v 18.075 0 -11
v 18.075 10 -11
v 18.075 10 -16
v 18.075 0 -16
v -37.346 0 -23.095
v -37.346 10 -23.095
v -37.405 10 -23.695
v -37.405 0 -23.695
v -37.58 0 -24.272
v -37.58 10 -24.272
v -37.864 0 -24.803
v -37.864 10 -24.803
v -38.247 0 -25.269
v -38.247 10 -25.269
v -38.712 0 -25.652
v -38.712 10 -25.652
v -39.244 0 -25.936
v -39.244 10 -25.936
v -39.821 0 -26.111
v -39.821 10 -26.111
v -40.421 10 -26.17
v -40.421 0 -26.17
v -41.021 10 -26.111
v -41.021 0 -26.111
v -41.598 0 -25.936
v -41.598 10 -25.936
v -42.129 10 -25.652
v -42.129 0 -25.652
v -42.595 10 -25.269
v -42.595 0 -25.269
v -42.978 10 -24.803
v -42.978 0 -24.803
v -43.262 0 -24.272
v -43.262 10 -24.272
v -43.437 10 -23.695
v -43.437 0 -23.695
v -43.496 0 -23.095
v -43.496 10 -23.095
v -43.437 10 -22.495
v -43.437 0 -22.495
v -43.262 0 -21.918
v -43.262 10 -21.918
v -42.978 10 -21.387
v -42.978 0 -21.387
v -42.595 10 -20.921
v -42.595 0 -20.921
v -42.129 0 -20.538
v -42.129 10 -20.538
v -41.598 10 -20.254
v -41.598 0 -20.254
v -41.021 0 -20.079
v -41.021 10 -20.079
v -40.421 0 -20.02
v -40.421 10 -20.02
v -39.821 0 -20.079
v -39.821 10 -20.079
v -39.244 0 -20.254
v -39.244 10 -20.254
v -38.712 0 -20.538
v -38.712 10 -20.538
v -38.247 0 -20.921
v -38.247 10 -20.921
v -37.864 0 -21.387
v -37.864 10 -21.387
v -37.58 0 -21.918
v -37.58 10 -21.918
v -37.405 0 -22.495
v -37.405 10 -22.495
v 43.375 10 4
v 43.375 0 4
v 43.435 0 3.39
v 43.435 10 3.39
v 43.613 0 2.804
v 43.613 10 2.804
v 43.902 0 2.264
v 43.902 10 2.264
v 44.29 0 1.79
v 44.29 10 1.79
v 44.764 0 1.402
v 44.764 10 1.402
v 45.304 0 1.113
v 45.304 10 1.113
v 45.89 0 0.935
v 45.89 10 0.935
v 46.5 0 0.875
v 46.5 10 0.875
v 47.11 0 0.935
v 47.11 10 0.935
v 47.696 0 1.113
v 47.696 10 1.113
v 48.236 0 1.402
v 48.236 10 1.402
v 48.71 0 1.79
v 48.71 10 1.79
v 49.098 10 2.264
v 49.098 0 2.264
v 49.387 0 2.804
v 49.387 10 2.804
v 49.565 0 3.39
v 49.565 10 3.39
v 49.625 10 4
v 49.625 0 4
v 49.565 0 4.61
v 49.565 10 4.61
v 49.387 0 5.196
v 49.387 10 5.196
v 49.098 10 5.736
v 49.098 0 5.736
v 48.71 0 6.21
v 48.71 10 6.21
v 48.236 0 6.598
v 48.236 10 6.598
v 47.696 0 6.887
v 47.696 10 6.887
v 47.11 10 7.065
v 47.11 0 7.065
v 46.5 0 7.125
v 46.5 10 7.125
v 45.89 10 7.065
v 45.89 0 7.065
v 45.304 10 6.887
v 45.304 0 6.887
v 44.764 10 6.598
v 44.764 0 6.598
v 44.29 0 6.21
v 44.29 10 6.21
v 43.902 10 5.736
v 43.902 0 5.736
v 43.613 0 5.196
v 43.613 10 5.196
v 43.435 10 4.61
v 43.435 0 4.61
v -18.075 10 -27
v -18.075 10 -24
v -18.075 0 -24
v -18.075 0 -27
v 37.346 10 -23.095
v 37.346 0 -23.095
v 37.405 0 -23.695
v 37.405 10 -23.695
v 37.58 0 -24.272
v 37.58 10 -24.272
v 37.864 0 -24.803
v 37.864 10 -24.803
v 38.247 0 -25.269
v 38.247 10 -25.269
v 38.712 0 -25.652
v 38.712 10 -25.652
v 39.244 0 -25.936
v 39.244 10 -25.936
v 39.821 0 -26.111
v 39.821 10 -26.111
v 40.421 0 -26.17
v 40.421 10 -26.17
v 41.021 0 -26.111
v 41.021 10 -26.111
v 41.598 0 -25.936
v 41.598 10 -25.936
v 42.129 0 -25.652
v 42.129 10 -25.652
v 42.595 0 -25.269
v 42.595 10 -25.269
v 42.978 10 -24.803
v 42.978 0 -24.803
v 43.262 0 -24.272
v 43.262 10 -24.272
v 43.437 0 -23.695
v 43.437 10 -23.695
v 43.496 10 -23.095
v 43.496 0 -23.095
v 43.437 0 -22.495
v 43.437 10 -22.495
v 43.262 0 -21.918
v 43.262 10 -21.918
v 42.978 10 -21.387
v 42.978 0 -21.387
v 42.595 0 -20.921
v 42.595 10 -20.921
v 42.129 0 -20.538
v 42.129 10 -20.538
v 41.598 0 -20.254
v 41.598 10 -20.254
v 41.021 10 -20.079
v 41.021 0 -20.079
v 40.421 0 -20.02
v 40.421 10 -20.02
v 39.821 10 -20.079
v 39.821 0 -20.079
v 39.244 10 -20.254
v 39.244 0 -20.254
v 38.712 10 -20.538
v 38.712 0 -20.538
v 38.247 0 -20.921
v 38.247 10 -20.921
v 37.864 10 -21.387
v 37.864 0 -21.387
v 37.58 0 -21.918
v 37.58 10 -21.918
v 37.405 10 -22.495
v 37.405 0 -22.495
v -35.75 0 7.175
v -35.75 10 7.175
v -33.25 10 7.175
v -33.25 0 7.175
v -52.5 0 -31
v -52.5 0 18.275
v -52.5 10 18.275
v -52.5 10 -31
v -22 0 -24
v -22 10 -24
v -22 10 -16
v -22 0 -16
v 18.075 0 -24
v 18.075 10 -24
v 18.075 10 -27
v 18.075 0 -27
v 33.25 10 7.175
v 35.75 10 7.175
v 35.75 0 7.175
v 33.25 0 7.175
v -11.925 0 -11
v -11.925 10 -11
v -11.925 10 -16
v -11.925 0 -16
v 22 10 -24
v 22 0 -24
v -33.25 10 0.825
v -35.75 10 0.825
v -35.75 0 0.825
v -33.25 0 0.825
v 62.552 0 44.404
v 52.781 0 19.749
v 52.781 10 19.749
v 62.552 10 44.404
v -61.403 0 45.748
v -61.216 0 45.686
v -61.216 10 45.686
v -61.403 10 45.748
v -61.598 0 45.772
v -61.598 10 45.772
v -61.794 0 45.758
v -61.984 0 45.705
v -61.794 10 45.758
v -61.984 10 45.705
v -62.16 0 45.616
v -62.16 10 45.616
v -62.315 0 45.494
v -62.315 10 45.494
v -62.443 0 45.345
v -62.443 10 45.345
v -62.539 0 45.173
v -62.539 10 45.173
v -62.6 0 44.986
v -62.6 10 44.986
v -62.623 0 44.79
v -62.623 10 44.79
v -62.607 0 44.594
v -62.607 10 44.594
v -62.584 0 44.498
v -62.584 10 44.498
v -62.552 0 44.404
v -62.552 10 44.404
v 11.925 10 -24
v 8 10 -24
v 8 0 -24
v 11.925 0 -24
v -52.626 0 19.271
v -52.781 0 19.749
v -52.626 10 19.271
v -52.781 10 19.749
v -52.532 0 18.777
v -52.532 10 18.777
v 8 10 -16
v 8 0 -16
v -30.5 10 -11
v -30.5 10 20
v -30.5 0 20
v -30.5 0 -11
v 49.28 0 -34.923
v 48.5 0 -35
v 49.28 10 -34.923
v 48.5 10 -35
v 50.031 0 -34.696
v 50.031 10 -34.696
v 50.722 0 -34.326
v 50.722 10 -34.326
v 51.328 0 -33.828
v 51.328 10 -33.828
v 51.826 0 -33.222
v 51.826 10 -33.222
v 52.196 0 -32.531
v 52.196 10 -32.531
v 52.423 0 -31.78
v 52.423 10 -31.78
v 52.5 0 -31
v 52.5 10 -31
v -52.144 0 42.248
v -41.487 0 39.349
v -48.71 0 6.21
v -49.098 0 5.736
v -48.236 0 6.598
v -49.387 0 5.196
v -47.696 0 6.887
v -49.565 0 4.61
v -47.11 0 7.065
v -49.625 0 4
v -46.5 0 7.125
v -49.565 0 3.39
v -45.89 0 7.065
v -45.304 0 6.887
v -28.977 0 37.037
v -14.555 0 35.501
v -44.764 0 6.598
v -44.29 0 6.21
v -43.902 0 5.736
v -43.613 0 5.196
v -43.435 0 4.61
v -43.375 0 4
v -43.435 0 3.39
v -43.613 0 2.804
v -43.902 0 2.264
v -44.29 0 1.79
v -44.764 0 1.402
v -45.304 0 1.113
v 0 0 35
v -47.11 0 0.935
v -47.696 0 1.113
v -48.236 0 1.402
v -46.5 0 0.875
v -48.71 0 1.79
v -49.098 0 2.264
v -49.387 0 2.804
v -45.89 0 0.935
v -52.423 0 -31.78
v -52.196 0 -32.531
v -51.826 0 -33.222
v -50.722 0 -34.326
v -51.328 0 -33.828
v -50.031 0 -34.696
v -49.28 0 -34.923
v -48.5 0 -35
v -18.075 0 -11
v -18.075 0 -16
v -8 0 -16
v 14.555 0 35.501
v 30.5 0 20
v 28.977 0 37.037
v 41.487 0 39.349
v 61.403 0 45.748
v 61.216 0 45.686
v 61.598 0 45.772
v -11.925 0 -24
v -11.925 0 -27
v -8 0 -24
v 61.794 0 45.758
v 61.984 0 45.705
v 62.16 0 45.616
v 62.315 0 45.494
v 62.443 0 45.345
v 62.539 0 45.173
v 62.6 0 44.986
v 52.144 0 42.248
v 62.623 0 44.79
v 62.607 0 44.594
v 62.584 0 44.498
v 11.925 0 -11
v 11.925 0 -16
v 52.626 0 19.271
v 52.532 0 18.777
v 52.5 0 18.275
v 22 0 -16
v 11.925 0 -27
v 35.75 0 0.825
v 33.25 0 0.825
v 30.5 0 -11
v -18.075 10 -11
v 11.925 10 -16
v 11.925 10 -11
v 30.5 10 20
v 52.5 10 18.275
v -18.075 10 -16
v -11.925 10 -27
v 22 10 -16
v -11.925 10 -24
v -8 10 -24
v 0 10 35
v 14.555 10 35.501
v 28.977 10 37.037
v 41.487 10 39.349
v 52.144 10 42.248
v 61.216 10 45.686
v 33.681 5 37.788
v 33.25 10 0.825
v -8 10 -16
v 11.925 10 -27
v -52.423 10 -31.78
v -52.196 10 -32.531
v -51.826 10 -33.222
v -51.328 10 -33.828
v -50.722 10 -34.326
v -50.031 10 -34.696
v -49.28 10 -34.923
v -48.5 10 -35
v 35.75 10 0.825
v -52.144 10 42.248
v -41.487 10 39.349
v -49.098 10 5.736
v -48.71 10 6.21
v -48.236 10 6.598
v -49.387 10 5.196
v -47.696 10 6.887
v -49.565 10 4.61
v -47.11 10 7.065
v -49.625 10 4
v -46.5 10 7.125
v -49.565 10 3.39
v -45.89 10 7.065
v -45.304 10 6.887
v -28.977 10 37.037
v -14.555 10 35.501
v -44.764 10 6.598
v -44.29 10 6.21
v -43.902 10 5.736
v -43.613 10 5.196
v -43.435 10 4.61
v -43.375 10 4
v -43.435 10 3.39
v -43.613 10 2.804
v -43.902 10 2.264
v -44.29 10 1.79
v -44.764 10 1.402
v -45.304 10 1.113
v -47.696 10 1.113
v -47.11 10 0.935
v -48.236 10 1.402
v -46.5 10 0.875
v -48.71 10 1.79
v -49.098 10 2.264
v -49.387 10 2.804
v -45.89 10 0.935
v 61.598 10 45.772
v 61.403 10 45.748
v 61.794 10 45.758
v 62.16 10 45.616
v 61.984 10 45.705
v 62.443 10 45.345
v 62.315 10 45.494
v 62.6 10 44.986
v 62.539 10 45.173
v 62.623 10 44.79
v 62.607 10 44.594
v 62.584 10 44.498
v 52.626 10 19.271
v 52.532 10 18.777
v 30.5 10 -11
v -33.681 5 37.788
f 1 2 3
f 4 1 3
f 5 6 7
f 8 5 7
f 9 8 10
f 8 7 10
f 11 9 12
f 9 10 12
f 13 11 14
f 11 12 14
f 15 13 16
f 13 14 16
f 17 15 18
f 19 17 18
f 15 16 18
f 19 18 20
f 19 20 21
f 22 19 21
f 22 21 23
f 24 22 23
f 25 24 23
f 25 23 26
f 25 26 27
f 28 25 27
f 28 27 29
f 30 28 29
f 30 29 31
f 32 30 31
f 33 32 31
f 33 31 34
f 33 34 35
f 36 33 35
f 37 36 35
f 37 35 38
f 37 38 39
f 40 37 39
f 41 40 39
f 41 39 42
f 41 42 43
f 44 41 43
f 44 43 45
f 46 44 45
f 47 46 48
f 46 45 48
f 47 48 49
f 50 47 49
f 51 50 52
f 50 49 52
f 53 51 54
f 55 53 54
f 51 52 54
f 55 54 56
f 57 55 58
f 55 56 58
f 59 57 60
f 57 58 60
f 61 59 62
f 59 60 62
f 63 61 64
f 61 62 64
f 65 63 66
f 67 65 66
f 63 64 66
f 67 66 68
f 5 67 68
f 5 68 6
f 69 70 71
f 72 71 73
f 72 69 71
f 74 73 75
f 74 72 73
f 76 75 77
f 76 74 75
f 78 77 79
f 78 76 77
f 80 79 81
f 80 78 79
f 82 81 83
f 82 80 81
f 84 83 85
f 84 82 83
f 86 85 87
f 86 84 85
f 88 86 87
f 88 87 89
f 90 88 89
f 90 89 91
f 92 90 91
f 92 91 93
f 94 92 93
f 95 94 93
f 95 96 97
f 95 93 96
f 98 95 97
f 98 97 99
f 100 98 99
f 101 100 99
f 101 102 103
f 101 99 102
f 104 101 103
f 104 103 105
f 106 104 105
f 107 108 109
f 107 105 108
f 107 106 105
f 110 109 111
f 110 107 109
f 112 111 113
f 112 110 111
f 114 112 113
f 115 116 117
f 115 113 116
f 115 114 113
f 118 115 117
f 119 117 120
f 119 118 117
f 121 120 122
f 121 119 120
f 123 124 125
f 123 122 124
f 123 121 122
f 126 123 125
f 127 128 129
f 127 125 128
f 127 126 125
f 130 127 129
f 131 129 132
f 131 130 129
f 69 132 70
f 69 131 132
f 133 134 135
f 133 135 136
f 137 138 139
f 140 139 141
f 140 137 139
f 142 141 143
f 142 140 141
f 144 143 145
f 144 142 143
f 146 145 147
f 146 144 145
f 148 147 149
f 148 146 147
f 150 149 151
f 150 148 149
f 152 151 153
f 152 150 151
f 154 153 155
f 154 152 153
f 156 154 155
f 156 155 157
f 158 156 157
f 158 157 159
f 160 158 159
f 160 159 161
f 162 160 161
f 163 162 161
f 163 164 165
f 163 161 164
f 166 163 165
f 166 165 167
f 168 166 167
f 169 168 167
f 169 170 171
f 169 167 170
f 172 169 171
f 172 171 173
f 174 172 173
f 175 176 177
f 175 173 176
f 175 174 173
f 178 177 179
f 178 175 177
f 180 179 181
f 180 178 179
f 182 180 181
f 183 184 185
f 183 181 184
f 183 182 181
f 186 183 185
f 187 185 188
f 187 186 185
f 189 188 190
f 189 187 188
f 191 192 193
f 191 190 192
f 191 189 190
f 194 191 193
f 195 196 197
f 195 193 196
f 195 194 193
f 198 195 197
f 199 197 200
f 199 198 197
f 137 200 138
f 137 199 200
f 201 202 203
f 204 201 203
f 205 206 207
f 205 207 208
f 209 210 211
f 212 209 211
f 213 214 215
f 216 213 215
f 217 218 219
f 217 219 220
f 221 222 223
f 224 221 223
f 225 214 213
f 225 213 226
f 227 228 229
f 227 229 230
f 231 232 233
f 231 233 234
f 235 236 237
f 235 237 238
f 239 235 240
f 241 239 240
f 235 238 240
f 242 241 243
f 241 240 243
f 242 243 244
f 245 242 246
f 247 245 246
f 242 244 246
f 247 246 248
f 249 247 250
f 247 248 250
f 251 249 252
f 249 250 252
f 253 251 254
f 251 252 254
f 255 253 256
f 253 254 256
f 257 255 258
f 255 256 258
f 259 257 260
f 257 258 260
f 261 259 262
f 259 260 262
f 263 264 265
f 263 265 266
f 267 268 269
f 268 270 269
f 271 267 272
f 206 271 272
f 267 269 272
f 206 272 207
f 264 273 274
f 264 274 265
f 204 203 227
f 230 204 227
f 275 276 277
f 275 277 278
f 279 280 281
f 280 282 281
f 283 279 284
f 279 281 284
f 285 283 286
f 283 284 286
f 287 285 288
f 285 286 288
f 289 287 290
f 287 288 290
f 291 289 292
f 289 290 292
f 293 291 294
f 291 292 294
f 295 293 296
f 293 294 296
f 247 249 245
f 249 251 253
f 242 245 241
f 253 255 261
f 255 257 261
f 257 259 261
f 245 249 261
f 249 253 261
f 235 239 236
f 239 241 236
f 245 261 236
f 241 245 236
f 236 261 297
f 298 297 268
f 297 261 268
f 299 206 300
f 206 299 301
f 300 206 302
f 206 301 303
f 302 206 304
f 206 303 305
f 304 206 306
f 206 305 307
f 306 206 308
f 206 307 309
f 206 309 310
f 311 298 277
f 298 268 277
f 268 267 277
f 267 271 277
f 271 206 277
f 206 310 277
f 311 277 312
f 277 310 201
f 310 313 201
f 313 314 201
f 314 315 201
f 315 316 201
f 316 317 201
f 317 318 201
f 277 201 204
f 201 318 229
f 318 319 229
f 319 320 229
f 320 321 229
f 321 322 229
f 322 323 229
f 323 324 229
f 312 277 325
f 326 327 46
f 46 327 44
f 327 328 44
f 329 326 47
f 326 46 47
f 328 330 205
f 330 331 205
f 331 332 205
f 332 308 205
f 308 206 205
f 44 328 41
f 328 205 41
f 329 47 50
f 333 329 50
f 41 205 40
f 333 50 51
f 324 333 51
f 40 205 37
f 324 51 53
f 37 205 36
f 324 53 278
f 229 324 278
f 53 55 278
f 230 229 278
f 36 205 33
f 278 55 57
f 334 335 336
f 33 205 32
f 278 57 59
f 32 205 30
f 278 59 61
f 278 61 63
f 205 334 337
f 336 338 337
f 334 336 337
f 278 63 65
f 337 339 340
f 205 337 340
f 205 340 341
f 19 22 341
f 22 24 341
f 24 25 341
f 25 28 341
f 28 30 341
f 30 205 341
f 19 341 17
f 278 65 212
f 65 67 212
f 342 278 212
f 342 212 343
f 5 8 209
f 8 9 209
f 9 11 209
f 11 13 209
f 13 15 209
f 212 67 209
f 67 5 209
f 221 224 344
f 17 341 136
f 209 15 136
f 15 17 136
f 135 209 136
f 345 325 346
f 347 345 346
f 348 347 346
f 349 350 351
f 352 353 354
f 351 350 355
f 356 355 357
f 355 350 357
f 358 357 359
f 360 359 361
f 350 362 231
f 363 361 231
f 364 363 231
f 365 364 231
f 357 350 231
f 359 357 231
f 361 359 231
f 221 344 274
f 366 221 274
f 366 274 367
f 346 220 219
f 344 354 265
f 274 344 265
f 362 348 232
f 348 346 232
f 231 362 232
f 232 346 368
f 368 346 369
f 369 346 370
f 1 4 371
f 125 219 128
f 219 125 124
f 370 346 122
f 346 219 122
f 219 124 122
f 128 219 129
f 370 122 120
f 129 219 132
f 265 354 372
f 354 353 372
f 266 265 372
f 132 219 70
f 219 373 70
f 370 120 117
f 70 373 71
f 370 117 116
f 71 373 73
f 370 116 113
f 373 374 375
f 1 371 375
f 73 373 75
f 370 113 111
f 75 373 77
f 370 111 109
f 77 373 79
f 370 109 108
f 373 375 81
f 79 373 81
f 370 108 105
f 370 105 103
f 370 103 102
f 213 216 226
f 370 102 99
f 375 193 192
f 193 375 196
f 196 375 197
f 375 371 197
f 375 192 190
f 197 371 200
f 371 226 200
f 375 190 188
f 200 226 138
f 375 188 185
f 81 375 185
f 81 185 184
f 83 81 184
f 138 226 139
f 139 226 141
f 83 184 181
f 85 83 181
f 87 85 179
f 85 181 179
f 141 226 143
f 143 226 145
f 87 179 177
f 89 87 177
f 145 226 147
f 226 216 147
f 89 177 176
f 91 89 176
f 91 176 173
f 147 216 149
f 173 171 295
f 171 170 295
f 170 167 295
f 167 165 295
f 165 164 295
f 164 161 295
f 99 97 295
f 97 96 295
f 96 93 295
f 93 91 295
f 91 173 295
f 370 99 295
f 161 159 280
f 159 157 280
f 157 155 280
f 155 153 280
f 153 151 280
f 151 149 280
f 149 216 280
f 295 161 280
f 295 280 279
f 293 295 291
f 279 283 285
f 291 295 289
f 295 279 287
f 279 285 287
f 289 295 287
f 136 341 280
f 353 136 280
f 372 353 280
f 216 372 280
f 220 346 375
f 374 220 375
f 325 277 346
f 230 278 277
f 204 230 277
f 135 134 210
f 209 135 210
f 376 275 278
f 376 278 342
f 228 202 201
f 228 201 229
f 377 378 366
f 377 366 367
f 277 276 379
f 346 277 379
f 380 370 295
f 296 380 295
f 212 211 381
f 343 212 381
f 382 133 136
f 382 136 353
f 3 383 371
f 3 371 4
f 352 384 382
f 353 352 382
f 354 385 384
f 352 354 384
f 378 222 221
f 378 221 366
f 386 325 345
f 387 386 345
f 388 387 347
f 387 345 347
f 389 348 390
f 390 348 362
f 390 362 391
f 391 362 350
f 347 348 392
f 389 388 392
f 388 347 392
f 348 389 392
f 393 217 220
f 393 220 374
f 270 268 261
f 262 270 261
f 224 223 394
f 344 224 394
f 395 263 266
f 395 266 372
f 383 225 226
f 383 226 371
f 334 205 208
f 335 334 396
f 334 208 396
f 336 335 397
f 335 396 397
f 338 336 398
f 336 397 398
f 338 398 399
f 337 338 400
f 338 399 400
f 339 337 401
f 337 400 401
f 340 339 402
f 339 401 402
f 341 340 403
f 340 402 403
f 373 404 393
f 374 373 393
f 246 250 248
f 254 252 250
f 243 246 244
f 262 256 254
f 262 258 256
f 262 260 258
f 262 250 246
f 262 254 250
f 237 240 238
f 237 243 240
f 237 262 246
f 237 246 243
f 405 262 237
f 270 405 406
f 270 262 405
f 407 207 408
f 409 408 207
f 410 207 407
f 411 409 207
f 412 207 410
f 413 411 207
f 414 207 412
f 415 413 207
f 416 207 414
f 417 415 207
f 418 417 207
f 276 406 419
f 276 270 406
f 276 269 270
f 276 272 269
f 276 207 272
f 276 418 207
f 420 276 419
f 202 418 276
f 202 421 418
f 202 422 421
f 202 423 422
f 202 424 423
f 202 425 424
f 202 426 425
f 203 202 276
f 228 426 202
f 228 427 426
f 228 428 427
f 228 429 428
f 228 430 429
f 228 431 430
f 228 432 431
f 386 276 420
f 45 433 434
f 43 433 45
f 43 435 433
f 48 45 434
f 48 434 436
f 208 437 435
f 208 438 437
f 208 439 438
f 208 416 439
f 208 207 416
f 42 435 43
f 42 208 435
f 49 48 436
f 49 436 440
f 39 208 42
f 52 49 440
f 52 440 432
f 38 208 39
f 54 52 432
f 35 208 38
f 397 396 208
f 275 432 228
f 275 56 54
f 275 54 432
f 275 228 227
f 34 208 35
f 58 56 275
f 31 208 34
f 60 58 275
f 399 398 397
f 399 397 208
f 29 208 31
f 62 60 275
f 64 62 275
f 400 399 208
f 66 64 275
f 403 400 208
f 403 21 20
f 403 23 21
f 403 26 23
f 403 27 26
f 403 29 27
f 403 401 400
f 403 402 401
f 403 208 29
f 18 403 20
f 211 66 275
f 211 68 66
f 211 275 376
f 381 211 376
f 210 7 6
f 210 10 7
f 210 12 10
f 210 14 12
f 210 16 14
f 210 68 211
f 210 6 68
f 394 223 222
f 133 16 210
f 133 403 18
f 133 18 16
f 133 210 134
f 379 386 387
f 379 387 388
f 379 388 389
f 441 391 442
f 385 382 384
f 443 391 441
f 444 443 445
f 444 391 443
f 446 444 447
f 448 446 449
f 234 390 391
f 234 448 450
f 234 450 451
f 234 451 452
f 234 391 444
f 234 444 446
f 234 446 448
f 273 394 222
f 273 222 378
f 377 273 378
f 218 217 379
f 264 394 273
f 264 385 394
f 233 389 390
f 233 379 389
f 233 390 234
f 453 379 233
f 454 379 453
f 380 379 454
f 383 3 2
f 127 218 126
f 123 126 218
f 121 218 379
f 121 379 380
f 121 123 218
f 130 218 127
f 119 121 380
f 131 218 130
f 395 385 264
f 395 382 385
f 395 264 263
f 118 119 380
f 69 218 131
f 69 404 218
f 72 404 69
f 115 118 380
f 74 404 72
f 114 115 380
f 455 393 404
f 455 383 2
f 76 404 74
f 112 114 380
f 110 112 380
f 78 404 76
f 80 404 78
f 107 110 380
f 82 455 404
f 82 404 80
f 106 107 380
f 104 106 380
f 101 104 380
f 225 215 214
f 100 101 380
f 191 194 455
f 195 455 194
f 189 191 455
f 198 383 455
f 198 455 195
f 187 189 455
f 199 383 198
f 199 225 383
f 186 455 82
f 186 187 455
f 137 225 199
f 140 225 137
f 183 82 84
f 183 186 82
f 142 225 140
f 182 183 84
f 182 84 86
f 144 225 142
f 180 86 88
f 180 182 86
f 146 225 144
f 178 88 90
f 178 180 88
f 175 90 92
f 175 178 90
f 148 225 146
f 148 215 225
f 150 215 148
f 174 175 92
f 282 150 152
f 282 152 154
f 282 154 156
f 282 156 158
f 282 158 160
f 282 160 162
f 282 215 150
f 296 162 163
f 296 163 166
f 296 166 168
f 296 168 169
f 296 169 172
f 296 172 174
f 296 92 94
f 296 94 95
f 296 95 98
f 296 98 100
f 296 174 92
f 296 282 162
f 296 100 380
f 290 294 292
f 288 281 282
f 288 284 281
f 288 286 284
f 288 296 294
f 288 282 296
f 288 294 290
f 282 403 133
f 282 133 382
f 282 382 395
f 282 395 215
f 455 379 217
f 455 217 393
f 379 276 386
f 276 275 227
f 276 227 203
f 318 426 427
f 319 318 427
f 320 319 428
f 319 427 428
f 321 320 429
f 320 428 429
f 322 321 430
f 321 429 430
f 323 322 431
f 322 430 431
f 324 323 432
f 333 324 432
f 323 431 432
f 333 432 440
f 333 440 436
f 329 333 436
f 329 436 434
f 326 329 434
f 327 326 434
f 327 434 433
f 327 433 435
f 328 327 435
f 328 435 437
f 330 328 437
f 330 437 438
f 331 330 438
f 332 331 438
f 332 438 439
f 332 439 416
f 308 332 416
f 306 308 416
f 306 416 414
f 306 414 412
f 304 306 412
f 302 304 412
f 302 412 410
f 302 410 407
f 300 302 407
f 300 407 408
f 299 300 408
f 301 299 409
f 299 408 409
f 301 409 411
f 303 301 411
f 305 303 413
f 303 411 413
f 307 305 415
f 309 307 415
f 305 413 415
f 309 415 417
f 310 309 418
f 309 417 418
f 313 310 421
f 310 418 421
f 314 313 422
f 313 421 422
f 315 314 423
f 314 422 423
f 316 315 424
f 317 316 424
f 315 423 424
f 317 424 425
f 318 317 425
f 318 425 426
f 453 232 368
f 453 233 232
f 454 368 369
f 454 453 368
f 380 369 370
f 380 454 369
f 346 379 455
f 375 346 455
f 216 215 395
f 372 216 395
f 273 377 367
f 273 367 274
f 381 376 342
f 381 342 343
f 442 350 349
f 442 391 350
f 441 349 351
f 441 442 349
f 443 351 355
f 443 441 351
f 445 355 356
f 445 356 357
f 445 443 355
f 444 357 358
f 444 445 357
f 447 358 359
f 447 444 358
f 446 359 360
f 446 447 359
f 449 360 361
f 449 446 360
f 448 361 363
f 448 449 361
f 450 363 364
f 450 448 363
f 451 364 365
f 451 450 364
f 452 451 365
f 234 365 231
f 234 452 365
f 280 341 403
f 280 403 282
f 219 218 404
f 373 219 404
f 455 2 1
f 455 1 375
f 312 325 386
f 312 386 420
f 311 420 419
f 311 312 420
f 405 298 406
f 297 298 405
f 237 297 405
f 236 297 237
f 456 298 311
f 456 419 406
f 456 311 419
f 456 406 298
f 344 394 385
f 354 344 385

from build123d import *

# Parameters (mm, degrees)
SKETCH1_W           = 105
SKETCH1_H           = 70
BOSS_EXTRUDE1_DEPTH = 10
SKETCH2_W           = 61
SKETCH2_H           = 31
CUT_EXTRUDE1_DEPTH  = 11
SKETCH3_W           = 6.15
SKETCH3_H           = 5
SKETCH3_H_2         = 3
CUT_EXTRUDE2_DEPTH  = 10
SKETCH4_R           = 3.125
SKETCH4_W           = 2.5
SKETCH4_H           = 6.35
CUT_EXTRUDE3_DEPTH  = 11
BOSS_EXTRUDE2_DEPTH = 10
SKETCH6_R           = 3.075
CUT_EXTRUDE4_DEPTH  = 11.0000001
FILLET2_R           = 1
FILLET1_R           = 4


with BuildPart() as part:
    # Sketch1 → Boss-Extrude1 (new body)
    with BuildSketch(Plane(origin=(0, 0, 0), x_dir=(1, 0, 0), z_dir=(0, 1, 0))):
        Rectangle(SKETCH1_W, SKETCH1_H)
    extrude(amount=BOSS_EXTRUDE1_DEPTH)

    # Sketch2 → Cut-Extrude1 (cut, through all)
    with BuildSketch(Plane(origin=(0, 10, 0), x_dir=(1, 0, 0), z_dir=(0, 1, 0))):
        with Locations((0, -4.5)):
            Rectangle(SKETCH2_W, SKETCH2_H)
    extrude(amount=-CUT_EXTRUDE1_DEPTH, mode=Mode.SUBTRACT)

    # Sketch3 → Cut-Extrude2 (cut)
    with BuildSketch(Plane(origin=(0, 10, 0), x_dir=(1, 0, 0), z_dir=(0, 1, 0))):
        with Locations((-15, 13.5)):
            Rectangle(SKETCH3_W, SKETCH3_H)
        Polygon((-18.075, 24), (-22, 24), (-22, 16), (-18.075, 16), (-11.925, 16), (-8, 16), (-8, 24), (-11.925, 24), (-11.925, 21), (-18.075, 21), align=None)
        with Locations((-15, 22.5)):
            Rectangle(SKETCH3_W, SKETCH3_H_2)
        with Locations((-15, 25.5)):
            Rectangle(SKETCH3_W, SKETCH3_H_2)
    cut_extrude2 = extrude(amount=-CUT_EXTRUDE2_DEPTH, mode=Mode.SUBTRACT)

    # Sketch4 → Cut-Extrude3 (cut, through all)
    with BuildSketch(Plane(origin=(0, 10, 0), x_dir=(1, 0, 0), z_dir=(0, 1, 0))):
        with Locations((-46.5, -4)):
            Circle(SKETCH4_R)
        with Locations((-34.5, -4)):
            Rectangle(SKETCH4_W, SKETCH4_H)
    cut_extrude3 = extrude(amount=-CUT_EXTRUDE3_DEPTH, mode=Mode.SUBTRACT)

    # Sketch5 → Boss-Extrude2 (add)
    with BuildSketch(Plane(origin=(0, 0, 0), x_dir=(1, 0, 0), z_dir=(0, 1, 0))):
        with BuildLine():
            Line((0, -35), (-52.5, -19.039128985))
            Line((-52.5, -19.039128985), (-63.478993436, -46.742400328))
            add(Edge.make_bspline(
                [(0, -35), (-39.462588608, -35), (-63.478993436, -46.742400328)],
                knots=[4.71238898, 4.71238898, 4.71238898, 5.628907116, 5.628907116, 5.628907116], degree=2, weights=[1, 0.896824023, 1]))
        make_face()
    boss_extrude2 = extrude(amount=BOSS_EXTRUDE2_DEPTH)

    # Sketch6 → Cut-Extrude4 (cut, through all)
    with BuildSketch(Plane(origin=(0, 10, 0), x_dir=(1, 0, 0), z_dir=(0, 1, 0))):
        with Locations((-40.420875644, 23.095045258)):
            Circle(SKETCH6_R)
    cut_extrude4 = extrude(amount=-CUT_EXTRUDE4_DEPTH, mode=Mode.SUBTRACT)

    # Mirror1: Cut-Extrude2, Cut-Extrude3, Boss-Extrude2, Cut-Extrude4 across plane
    add(cut_extrude2.mirror(Plane(origin=(0, 0, 0), x_dir=(0, 0, 1), z_dir=(1, 0, 0))), mode=Mode.SUBTRACT)
    add(cut_extrude3.mirror(Plane(origin=(0, 0, 0), x_dir=(0, 0, 1), z_dir=(1, 0, 0))), mode=Mode.SUBTRACT)
    add(boss_extrude2.mirror(Plane(origin=(0, 0, 0), x_dir=(0, 0, 1), z_dir=(1, 0, 0))))
    add(cut_extrude4.mirror(Plane(origin=(0, 0, 0), x_dir=(0, 0, 1), z_dir=(1, 0, 0))), mode=Mode.SUBTRACT)

    # Fillet2
    fillet2_edges = [part.edges().sort_by_distance(p)[0] for p in [
        (-63.478993436, 5, 46.742400328),
        (63.478993436, 5, 46.742400328),
    ]]
    fillet(fillet2_edges, radius=FILLET2_R)

    # Fillet1
    fillet1_edges = [part.edges().sort_by_distance(p)[0] for p in [
        (52.5, 5, 19.039128985),
        (-52.5, 5, -35),
        (52.5, 5, -35),
        (-52.5, 5, 19.039128985),
    ]]
    fillet(fillet1_edges, radius=FILLET1_R)


solid = part.part
